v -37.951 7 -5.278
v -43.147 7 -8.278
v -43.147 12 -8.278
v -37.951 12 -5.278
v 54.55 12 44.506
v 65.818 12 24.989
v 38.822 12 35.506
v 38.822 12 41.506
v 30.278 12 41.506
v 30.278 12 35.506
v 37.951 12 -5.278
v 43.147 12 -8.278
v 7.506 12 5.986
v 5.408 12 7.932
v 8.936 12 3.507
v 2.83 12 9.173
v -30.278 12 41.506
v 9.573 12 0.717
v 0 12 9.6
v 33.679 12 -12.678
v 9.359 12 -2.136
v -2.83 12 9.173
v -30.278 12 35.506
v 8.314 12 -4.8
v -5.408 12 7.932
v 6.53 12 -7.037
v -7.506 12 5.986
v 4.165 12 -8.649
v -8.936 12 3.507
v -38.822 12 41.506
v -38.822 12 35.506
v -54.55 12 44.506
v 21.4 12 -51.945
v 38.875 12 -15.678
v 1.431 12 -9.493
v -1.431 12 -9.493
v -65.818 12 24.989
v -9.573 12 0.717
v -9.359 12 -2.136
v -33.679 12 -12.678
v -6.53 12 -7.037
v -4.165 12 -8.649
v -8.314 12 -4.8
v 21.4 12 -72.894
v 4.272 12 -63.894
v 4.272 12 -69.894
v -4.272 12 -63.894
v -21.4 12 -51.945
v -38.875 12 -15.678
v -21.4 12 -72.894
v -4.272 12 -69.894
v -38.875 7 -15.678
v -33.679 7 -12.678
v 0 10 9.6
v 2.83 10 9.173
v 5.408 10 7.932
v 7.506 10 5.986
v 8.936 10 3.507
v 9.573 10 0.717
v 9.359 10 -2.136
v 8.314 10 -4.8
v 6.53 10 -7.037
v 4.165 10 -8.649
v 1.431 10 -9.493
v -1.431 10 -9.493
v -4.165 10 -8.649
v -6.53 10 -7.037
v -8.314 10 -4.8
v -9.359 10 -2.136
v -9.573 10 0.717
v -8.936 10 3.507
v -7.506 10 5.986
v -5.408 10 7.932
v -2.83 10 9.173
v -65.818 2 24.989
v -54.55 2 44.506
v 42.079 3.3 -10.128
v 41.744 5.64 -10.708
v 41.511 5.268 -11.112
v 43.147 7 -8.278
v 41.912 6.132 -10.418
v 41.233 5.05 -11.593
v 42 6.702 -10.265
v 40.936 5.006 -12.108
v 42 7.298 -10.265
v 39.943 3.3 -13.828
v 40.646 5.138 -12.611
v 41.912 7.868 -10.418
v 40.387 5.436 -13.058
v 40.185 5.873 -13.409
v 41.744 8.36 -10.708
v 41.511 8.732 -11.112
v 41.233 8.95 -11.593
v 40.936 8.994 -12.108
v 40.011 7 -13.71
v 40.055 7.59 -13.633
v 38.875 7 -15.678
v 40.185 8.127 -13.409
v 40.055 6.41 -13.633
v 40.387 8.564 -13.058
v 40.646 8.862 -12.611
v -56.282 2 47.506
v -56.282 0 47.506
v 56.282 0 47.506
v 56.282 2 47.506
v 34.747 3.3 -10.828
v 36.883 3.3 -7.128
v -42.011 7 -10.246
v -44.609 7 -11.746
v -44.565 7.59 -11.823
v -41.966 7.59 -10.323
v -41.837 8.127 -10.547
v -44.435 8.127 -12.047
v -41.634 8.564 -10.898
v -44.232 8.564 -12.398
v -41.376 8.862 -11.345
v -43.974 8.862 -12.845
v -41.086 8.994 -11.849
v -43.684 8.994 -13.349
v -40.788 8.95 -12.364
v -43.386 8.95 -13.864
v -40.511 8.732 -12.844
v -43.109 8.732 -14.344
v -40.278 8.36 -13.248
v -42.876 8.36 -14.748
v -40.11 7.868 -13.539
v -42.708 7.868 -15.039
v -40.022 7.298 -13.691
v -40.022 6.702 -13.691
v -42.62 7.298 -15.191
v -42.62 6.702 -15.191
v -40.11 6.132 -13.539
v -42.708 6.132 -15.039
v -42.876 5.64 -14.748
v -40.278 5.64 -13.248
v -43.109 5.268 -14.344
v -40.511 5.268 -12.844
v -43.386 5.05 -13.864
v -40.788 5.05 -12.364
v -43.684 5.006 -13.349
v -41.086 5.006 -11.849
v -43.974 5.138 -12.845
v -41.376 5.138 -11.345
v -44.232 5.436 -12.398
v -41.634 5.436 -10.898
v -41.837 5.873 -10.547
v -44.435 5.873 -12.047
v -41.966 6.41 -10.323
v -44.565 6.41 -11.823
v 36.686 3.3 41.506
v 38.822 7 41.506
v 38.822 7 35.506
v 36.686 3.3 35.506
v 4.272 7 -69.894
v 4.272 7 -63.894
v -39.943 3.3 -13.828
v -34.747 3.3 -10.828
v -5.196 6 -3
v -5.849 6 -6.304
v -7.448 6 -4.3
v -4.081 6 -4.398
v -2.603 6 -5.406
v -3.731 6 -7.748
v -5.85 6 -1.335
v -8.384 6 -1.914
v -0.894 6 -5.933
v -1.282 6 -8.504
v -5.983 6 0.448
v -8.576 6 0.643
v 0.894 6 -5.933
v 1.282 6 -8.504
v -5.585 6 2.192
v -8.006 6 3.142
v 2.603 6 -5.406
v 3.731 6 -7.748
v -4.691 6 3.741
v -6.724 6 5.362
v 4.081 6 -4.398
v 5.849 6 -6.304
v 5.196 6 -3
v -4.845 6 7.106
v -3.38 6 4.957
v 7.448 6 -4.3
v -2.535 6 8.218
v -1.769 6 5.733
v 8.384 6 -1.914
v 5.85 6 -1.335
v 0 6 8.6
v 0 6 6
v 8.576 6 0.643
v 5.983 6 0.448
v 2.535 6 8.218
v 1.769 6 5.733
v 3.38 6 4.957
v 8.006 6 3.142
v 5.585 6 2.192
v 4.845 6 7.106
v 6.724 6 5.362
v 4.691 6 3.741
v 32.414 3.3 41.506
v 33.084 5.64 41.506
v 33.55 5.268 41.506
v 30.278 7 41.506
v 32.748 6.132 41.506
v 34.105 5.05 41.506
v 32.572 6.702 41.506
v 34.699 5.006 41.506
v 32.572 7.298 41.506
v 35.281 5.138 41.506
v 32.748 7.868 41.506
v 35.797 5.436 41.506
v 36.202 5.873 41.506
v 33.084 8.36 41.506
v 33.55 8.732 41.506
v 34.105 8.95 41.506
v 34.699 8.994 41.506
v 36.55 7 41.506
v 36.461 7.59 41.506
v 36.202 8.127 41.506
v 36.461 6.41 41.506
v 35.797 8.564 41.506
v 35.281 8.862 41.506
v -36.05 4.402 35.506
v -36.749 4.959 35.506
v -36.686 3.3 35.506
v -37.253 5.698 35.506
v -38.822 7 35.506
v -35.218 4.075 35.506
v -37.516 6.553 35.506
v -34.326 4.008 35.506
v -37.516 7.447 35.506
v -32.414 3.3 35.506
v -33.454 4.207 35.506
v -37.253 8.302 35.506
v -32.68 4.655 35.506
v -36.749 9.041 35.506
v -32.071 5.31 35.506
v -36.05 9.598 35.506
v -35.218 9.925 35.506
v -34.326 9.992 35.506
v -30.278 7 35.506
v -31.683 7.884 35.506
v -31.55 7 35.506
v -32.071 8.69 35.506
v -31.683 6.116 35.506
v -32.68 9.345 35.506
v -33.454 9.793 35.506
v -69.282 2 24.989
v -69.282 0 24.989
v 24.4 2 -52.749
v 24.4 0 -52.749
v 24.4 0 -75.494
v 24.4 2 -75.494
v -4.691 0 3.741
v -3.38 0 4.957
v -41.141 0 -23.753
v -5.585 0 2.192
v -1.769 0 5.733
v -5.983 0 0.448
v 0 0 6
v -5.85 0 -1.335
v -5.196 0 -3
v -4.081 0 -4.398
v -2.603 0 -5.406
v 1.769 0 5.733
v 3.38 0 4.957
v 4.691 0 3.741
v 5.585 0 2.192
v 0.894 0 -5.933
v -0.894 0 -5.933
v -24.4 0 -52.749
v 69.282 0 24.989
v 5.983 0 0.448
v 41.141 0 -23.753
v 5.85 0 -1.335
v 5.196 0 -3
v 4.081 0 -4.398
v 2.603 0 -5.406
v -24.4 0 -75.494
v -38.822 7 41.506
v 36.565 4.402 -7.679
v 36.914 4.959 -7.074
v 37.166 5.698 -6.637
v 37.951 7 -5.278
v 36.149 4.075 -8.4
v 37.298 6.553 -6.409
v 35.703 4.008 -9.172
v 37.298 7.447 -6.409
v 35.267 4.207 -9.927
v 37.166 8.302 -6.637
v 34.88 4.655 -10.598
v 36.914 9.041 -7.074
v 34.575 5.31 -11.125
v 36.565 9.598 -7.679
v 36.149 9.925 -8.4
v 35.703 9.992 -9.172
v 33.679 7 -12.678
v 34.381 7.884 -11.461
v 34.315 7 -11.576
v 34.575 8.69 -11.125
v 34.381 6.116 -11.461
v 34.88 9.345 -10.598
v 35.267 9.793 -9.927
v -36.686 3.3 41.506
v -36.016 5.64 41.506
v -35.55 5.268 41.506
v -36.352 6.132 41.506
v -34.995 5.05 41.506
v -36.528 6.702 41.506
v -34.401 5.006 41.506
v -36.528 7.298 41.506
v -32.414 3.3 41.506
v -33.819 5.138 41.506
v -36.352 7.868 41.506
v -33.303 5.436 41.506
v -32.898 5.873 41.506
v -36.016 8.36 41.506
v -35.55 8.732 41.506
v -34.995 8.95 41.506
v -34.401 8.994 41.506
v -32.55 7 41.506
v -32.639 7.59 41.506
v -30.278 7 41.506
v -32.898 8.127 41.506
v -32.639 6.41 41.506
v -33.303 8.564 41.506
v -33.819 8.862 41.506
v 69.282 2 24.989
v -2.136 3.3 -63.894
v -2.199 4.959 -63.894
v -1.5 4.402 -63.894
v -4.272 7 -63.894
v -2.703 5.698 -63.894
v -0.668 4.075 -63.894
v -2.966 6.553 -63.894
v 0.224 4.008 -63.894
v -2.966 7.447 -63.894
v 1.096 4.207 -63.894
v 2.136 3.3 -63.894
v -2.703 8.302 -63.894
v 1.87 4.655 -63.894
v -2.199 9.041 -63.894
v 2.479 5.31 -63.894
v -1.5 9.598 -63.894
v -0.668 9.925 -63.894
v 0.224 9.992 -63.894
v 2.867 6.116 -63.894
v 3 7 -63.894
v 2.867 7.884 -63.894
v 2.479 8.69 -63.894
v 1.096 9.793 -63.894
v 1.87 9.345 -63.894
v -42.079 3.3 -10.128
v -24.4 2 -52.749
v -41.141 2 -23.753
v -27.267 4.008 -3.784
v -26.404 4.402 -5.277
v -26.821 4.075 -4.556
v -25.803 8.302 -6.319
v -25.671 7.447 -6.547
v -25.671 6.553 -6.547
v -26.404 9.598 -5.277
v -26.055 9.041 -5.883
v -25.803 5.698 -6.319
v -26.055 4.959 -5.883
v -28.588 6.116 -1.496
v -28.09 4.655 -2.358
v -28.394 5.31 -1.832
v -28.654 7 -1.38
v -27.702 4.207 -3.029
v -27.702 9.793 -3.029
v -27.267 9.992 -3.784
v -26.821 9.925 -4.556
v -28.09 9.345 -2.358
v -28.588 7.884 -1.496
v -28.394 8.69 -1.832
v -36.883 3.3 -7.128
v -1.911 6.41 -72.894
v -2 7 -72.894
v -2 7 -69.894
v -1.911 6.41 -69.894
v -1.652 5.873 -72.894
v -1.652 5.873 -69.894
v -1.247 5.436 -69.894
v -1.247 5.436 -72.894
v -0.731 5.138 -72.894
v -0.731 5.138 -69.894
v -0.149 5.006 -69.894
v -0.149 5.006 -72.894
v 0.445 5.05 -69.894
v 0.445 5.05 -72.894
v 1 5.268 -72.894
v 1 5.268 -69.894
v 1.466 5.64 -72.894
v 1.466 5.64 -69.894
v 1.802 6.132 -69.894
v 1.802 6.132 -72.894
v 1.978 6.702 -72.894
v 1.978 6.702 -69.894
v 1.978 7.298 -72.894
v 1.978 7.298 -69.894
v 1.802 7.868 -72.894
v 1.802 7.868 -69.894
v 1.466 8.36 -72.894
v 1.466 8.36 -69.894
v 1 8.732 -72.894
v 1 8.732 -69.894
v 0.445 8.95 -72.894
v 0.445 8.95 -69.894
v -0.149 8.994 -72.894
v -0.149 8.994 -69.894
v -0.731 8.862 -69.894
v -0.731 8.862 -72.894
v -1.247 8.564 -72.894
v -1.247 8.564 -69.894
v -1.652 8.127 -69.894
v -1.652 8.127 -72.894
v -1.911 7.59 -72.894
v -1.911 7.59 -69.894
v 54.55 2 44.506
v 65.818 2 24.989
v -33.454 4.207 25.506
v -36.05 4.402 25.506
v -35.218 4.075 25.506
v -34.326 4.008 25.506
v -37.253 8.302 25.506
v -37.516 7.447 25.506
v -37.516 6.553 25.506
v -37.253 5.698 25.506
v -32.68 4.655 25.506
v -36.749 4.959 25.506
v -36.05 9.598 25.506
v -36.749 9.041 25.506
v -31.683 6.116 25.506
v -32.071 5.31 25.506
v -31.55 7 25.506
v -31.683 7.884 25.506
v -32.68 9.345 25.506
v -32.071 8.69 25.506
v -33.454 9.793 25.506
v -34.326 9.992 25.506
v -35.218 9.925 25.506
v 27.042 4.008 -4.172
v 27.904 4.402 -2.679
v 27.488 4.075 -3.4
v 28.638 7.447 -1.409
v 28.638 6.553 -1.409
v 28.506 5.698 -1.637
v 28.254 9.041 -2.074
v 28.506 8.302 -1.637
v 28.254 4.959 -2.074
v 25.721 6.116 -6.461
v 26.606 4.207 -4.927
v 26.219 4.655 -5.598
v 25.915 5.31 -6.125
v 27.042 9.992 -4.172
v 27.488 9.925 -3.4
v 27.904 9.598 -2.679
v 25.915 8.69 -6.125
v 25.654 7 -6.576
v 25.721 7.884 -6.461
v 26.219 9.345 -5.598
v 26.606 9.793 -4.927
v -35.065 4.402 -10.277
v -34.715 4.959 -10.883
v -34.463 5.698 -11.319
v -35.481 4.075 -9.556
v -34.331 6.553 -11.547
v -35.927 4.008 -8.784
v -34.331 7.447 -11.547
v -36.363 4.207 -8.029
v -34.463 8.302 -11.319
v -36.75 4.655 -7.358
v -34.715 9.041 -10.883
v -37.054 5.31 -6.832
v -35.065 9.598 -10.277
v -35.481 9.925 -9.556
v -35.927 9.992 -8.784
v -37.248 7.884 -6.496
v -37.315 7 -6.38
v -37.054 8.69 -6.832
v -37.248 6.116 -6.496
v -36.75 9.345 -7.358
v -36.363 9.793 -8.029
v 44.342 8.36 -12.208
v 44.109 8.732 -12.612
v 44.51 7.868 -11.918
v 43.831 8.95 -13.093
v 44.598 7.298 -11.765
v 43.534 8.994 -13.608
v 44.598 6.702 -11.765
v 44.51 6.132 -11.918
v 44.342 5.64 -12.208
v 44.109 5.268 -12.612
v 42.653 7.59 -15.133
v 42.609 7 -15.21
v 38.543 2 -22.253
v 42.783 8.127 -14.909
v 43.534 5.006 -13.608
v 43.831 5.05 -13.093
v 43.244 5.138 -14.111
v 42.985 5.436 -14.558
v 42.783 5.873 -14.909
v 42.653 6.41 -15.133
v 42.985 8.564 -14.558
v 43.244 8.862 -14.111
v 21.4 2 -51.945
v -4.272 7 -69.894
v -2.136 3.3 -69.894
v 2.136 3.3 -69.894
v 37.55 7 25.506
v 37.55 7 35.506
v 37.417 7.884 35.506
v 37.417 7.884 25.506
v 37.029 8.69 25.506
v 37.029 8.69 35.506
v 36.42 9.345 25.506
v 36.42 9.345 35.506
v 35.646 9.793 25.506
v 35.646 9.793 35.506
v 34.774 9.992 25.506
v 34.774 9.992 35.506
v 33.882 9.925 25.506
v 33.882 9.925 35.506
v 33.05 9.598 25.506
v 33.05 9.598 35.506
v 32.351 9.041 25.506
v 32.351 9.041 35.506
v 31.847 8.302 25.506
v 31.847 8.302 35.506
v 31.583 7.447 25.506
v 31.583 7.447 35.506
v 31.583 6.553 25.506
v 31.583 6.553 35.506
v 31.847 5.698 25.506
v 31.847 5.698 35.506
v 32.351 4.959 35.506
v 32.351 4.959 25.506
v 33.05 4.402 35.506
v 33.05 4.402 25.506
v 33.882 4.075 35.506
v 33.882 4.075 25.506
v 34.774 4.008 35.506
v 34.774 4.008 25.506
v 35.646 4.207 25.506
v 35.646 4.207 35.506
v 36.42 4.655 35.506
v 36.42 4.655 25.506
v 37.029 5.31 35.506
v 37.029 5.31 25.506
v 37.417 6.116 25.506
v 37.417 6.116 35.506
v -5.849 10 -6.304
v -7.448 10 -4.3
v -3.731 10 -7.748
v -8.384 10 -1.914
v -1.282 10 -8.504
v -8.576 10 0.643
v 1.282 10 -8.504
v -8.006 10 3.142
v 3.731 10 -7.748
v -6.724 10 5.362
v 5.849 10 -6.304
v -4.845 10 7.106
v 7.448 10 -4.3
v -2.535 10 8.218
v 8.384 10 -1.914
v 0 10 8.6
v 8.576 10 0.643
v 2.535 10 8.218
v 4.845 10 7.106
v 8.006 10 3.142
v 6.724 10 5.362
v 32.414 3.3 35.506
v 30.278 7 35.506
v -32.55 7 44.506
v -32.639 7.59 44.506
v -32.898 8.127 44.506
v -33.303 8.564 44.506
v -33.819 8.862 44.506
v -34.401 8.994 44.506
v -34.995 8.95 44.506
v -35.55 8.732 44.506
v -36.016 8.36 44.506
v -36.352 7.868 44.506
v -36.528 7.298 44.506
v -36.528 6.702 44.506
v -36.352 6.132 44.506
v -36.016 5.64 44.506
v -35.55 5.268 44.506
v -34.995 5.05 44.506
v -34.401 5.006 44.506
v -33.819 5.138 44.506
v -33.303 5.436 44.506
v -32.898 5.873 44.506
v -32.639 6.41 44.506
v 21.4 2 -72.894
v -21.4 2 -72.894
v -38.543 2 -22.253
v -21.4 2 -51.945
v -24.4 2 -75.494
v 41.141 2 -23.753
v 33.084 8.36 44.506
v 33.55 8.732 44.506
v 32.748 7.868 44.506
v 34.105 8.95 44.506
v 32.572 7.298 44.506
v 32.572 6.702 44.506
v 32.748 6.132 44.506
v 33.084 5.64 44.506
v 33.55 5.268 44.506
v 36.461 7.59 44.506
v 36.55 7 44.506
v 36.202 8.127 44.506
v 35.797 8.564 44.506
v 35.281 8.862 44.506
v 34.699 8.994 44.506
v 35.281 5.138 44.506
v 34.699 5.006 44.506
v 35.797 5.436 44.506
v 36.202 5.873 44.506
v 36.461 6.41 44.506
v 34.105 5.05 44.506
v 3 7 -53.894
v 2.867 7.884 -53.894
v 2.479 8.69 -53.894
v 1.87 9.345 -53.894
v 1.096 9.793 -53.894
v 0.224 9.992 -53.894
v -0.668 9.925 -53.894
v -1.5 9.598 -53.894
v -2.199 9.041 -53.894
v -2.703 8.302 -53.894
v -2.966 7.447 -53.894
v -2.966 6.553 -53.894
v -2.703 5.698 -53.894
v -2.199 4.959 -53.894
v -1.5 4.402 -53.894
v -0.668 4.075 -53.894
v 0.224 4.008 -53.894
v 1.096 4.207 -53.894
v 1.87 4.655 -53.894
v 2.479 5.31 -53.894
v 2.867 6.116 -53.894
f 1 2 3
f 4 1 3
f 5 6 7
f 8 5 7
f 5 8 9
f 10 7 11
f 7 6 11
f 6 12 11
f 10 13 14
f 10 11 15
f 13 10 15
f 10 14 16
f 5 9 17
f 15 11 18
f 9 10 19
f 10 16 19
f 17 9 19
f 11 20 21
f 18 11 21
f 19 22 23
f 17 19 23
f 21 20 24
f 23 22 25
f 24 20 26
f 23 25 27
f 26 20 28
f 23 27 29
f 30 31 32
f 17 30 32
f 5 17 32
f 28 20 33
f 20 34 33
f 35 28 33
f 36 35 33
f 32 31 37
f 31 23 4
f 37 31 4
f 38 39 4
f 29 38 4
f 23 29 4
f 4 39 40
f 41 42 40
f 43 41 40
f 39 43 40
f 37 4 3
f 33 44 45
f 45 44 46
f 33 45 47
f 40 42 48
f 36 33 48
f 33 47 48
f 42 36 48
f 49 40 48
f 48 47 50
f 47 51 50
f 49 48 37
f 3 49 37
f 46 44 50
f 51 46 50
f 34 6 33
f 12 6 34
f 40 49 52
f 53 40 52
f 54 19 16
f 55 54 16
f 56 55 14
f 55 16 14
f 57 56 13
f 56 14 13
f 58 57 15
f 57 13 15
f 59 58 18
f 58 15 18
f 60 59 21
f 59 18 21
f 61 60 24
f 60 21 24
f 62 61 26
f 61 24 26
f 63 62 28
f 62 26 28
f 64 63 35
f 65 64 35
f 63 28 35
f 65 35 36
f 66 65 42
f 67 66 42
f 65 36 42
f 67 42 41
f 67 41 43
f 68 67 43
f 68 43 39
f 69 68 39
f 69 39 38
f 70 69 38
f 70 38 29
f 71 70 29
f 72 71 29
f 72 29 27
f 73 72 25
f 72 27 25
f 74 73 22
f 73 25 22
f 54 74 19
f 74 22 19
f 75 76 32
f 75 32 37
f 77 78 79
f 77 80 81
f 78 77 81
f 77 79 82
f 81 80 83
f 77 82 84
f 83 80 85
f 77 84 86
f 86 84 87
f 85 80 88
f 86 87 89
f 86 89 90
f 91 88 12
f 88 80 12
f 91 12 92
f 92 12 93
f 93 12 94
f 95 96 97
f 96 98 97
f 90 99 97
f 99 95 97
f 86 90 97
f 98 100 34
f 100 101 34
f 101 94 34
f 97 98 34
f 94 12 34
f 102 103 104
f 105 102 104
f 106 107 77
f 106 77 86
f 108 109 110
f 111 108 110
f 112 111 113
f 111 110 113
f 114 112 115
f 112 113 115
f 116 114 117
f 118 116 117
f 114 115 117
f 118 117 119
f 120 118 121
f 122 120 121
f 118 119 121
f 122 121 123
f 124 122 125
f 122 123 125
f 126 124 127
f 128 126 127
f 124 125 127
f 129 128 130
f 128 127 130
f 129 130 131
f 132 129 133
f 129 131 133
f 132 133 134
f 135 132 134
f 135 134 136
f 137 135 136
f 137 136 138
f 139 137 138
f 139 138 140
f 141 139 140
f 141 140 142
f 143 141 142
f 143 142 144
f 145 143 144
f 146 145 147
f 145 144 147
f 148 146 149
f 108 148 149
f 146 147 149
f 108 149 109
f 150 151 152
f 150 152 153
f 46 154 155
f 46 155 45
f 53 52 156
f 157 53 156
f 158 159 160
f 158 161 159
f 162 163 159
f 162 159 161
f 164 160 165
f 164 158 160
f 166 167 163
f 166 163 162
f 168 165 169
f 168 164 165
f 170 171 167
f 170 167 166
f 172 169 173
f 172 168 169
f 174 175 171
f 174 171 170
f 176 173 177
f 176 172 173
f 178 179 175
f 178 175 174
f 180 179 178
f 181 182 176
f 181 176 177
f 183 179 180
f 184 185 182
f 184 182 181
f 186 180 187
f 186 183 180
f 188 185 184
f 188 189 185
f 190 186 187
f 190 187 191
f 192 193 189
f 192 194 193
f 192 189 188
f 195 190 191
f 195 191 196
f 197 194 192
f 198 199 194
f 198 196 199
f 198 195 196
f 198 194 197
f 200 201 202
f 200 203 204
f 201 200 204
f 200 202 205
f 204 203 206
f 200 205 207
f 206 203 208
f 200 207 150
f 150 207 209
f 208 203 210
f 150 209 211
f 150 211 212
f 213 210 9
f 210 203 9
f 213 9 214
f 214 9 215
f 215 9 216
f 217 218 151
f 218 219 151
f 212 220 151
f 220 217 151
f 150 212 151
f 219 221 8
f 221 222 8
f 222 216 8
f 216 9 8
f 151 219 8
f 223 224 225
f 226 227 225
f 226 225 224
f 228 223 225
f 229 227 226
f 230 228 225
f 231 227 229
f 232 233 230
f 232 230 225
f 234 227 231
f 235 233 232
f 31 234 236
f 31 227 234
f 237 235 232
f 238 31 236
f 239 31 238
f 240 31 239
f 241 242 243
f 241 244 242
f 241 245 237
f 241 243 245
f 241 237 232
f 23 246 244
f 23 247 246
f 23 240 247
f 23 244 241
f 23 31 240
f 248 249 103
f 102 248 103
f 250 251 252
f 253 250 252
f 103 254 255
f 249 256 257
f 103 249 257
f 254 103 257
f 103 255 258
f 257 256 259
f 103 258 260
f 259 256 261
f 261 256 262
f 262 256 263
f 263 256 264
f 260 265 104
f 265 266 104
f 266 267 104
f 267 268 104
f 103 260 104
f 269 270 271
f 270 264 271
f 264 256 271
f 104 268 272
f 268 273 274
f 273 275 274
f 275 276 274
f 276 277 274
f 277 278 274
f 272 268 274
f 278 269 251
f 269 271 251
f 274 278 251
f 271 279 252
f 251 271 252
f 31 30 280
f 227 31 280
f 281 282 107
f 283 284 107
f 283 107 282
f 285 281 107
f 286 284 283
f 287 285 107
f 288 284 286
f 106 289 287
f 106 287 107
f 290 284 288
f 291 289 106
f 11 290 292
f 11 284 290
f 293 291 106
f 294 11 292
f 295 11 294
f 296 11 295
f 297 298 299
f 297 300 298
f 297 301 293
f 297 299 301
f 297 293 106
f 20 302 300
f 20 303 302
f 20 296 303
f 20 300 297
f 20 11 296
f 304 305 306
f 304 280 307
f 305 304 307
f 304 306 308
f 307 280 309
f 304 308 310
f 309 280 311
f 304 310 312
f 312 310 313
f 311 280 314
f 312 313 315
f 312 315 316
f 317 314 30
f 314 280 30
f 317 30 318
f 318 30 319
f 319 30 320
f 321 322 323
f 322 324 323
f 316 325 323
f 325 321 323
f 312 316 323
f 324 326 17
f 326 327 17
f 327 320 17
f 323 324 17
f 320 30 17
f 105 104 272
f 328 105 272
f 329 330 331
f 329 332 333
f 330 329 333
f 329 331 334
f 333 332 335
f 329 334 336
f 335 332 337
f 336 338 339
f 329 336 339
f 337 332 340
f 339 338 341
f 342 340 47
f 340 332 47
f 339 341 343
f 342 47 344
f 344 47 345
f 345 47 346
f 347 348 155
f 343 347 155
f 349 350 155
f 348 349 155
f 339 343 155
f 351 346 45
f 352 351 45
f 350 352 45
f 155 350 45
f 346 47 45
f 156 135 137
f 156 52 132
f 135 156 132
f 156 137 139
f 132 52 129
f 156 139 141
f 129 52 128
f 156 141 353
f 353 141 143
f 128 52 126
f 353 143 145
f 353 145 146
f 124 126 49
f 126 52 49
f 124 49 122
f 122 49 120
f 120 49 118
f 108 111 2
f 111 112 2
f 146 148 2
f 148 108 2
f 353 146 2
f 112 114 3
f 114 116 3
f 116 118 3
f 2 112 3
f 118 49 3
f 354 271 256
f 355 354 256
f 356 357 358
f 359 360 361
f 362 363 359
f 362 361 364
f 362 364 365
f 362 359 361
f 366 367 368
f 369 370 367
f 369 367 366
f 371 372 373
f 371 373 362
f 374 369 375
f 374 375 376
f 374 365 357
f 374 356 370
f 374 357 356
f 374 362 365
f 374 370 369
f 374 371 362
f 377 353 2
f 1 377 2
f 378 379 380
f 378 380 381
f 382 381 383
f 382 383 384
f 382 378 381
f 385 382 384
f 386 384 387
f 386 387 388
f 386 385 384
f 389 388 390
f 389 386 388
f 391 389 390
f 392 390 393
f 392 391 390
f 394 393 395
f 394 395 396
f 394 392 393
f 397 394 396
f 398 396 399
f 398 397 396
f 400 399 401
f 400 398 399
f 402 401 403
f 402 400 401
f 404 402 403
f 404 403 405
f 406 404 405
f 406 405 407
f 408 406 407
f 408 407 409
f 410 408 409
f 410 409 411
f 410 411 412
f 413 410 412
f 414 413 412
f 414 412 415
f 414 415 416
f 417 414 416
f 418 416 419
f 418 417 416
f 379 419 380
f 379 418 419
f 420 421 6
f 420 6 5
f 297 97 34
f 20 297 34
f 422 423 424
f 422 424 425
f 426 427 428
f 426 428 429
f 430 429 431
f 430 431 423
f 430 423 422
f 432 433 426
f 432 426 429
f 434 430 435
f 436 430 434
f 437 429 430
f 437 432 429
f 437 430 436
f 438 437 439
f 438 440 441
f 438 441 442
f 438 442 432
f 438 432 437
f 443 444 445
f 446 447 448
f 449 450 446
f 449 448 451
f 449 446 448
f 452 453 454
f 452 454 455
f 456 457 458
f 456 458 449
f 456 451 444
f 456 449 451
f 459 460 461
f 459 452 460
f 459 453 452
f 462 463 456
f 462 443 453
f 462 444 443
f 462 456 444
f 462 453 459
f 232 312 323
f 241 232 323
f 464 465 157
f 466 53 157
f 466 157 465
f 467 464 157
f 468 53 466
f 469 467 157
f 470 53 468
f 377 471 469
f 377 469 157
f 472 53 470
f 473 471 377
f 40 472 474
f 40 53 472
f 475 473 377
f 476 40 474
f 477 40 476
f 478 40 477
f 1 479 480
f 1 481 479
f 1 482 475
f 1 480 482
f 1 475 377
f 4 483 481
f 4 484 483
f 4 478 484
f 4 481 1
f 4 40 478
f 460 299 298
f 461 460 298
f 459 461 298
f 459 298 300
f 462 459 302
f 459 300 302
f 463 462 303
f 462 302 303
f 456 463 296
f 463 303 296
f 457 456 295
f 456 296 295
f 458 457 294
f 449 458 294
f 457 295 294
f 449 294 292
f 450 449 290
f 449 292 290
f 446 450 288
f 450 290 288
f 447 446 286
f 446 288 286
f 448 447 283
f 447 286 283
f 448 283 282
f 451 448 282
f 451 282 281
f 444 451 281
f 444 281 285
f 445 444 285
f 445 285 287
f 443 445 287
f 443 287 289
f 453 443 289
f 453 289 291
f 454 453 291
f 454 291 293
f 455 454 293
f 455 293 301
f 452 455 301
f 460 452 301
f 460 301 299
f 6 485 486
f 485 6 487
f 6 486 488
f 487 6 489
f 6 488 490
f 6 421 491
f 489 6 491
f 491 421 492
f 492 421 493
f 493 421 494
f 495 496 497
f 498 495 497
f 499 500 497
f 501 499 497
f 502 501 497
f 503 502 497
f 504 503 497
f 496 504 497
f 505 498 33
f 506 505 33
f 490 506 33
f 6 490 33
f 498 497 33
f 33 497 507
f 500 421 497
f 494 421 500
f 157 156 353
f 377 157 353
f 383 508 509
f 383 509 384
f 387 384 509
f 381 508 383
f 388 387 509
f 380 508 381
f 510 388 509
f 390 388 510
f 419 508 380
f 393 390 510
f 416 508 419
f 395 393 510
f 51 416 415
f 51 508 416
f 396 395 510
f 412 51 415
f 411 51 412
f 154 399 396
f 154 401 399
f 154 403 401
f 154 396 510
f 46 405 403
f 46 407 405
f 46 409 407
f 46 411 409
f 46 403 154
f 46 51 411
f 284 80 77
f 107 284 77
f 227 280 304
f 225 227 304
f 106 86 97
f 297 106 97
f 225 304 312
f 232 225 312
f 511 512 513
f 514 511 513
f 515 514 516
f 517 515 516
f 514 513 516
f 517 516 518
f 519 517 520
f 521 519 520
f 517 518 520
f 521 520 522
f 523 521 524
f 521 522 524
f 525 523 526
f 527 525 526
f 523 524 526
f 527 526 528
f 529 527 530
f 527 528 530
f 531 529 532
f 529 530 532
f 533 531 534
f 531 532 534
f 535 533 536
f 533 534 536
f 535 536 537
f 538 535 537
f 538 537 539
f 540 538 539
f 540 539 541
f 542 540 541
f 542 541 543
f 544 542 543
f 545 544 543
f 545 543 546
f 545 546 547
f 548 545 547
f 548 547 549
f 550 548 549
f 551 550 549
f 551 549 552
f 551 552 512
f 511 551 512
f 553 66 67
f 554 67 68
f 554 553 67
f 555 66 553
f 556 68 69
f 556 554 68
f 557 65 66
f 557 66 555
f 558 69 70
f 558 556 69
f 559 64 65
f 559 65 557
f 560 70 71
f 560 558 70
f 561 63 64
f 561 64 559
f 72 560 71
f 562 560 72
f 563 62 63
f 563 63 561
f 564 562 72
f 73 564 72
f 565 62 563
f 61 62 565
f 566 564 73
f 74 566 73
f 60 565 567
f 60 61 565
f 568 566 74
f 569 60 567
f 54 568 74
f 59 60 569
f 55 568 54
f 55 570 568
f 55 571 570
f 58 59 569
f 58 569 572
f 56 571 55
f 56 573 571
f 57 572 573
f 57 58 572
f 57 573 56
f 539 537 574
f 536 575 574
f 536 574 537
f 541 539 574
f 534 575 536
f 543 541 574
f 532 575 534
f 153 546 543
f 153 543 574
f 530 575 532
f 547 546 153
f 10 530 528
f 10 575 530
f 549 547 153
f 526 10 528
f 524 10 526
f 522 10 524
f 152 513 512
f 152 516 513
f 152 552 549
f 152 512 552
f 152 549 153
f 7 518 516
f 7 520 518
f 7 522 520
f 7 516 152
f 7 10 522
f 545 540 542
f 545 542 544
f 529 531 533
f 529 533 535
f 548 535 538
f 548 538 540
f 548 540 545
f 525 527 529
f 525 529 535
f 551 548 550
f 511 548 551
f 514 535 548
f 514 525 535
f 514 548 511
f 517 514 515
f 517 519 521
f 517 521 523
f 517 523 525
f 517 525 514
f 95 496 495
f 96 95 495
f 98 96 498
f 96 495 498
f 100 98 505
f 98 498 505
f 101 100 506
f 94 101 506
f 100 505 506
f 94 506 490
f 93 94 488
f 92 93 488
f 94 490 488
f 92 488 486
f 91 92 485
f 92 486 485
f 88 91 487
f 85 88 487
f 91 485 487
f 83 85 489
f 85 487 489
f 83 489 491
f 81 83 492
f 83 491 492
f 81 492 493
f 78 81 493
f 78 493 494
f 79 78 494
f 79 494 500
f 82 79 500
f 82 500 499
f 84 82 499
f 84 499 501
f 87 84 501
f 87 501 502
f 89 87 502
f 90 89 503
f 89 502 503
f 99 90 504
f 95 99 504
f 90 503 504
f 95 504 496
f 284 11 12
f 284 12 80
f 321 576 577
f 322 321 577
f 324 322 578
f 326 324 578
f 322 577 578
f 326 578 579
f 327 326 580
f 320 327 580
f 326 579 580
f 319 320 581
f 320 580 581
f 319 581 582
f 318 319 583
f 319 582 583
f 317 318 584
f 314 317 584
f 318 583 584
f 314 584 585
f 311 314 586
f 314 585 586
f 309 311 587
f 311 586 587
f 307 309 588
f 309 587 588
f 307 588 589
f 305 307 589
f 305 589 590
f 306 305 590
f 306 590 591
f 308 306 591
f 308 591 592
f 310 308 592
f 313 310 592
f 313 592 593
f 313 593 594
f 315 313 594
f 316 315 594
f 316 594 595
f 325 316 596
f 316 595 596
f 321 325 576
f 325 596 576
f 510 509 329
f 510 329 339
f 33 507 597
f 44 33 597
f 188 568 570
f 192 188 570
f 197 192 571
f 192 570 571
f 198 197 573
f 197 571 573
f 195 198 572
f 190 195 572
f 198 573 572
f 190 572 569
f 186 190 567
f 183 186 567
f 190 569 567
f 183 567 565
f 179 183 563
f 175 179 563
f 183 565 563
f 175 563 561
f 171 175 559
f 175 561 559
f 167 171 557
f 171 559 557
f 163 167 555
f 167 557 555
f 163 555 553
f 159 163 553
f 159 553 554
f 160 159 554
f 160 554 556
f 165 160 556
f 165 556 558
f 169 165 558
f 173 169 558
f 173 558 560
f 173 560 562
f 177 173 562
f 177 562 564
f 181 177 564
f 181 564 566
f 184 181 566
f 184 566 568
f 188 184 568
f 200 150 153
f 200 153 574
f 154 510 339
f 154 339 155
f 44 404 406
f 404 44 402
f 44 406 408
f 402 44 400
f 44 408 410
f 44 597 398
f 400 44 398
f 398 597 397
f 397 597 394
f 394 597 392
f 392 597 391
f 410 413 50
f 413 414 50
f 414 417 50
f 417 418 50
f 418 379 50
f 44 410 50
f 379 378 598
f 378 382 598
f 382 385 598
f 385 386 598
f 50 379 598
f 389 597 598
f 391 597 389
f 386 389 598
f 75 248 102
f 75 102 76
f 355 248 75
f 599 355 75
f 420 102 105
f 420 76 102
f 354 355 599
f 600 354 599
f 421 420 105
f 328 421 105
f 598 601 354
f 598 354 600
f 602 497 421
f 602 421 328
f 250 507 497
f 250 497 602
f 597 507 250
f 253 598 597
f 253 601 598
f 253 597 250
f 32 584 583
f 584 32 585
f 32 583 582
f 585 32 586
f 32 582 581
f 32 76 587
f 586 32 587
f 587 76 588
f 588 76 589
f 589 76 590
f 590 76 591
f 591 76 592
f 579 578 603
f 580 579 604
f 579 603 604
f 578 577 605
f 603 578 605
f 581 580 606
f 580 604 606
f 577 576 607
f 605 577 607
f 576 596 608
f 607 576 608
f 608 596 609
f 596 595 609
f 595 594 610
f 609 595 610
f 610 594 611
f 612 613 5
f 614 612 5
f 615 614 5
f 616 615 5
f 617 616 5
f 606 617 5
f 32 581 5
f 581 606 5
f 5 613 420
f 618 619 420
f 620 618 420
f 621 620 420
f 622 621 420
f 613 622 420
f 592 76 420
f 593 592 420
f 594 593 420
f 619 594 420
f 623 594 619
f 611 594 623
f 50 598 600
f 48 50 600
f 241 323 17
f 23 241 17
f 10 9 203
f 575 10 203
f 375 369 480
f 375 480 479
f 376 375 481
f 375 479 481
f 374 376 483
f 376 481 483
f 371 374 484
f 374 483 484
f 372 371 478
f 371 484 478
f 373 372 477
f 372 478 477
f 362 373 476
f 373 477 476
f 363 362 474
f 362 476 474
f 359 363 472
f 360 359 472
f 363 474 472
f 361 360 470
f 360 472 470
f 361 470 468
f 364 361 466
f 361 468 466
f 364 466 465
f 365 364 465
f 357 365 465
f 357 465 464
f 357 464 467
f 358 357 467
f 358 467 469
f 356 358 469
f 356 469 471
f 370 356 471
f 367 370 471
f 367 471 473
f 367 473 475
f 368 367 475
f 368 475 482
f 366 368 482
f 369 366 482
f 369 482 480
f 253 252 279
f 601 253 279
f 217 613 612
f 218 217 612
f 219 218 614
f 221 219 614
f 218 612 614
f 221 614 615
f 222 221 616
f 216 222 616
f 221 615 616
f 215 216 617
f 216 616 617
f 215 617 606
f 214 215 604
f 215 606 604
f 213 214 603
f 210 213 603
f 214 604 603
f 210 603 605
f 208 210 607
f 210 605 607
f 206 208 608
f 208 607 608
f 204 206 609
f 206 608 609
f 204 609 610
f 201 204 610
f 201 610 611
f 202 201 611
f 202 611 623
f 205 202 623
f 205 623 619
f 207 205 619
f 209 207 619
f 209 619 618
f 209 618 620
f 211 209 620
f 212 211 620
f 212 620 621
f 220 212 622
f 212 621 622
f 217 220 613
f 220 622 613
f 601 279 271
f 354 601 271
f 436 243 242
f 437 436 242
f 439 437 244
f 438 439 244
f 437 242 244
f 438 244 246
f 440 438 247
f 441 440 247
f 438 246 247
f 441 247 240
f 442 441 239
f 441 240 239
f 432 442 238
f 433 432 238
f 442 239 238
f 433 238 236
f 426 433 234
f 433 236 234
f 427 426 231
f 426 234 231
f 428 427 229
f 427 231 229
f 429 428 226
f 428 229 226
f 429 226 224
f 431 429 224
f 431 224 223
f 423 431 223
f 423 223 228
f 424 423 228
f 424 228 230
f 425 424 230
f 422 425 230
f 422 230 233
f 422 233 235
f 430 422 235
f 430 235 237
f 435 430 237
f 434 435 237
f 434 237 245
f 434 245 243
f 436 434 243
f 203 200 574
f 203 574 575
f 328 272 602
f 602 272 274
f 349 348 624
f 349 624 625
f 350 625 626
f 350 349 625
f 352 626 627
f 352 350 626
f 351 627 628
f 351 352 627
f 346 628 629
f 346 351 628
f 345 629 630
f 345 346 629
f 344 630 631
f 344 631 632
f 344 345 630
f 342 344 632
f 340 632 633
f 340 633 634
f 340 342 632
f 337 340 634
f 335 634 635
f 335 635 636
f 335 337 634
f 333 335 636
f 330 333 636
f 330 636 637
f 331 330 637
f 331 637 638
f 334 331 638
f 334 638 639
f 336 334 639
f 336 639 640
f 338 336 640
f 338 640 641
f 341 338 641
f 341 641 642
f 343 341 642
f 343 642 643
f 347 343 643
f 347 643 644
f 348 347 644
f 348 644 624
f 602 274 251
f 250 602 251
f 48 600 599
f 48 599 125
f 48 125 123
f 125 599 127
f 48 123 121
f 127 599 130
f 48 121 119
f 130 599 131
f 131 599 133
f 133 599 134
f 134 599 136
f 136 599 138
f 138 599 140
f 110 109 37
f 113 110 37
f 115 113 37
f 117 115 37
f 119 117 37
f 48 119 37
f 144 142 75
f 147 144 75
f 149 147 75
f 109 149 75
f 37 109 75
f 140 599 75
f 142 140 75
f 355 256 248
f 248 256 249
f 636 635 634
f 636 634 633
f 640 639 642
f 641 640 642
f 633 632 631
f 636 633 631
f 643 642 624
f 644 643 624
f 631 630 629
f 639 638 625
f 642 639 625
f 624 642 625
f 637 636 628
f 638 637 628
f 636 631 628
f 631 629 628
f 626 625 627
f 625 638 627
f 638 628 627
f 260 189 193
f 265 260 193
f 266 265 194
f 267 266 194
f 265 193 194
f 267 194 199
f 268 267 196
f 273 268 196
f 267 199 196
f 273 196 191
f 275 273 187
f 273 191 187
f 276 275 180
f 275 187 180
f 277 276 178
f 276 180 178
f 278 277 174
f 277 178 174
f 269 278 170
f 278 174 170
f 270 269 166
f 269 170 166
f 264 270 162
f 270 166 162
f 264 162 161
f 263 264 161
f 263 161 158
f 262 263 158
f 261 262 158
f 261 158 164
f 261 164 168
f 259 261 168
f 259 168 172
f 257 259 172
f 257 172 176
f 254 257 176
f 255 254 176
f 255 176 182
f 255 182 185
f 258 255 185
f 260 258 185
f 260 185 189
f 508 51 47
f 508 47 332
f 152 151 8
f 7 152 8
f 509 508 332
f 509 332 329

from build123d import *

# Parameters (mm, degrees)
SKETCH1_R           = 9.6
SKETCH1_R_2         = 8.6
SKETCH1_R_3         = 6
BOSS_EXTRUDE1_DEPTH = 12
BOSS_EXTRUDE2_DEPTH = 2
CUT_EXTRUDE1_START  = 12
SKETCH1_4_R         = 9.6
SKETCH1_4_R_2       = 8.6
CUT_EXTRUDE1_DEPTH  = 2
CUT_EXTRUDE2_START  = 12
SKETCH1_5_R         = 8.6
SKETCH1_5_R_2       = 6
CUT_EXTRUDE2_DEPTH  = 6
CUT_EXTRUDE3_START  = 12
SKETCH1_6_R         = 6
CUT_EXTRUDE3_DEPTH  = 116.166910647
SKETCH2_R           = 2
CUT_EXTRUDE4_DEPTH  = 3
CUT_EXTRUDE5_START  = -3
SKETCH2_4_R         = 3
SKETCH2_4_R_2       = 2
CUT_EXTRUDE5_DEPTH  = 6
CUT_EXTRUDE6_START  = -3
SKETCH2_5_R         = 3
SKETCH2_5_R_2       = 2
CUT_EXTRUDE6_DEPTH  = 16
SKETCH3_R           = 2
CUT_EXTRUDE7_DEPTH  = 3
CUT_EXTRUDE8_START  = 3
SKETCH3_7_R         = 3
SKETCH3_7_R_2       = 2
CUT_EXTRUDE8_DEPTH  = 6
CUT_EXTRUDE9_START  = 3
SKETCH3_8_R         = 3
SKETCH3_8_R_2       = 2
CUT_EXTRUDE9_DEPTH  = 16
SKETCH4_R           = 2
CUT_EXTRUDE10_DEPTH = 3
CUT_EXTRUDE11_START = -3
SKETCH4_3_R         = 3
SKETCH4_3_R_2       = 2
CUT_EXTRUDE11_DEPTH = 6
CUT_EXTRUDE12_START = -3
SKETCH4_4_R         = 3
SKETCH4_4_R_2       = 2
CUT_EXTRUDE12_DEPTH = 16
SKETCH5_R           = 2
CUT_EXTRUDE13_DEPTH = 3
CUT_EXTRUDE14_START = -3
SKETCH5_3_R         = 3
SKETCH5_3_R_2       = 2
CUT_EXTRUDE14_DEPTH = 6
CUT_EXTRUDE15_START = -3
SKETCH5_4_R         = 3
SKETCH5_4_R_2       = 2
CUT_EXTRUDE15_DEPTH = 16


with BuildPart() as part:
    # Sketch1 → Boss-Extrude1 (new body)
    # profile 1 of 7: a face of its own
    with BuildSketch(Plane(origin=(0, 0, 0), x_dir=(1, 0, 0), z_dir=(0, 1, 0))):
        Polygon((-65.817930688, -24.988893001), (-38.54293994, 22.25277675), (-11.267949192, 69.494446501), (11.267949192, 69.494446501), (38.54293994, 22.25277675), (65.817930688, -24.988893001), (54.549981495, -44.505553499), (0, -44.505553499), (-54.549981495, -44.505553499), align=None)
        Polygon((-52.817930688, -41.505553499), (-62.353829072, -24.988893001), (-35.944863729, 20.75277675), (-9.535898385, 66.494446501), (9.535898385, 66.494446501), (35.944863729, 20.75277675), (62.353829072, -24.988893001), (52.817930688, -41.505553499), (0, -41.505553499), align=None, mode=Mode.SUBTRACT)
    # profile 2 of 7: a face of its own
    with BuildSketch(Plane(origin=(0, 0, 0), x_dir=(1, 0, 0), z_dir=(0, 1, 0))):
        Polygon((-62.353829072, -24.988893001), (-35.944863729, 20.75277675), (-9.535898385, 66.494446501), (9.535898385, 66.494446501), (35.944863729, 20.75277675), (62.353829072, -24.988893001), (52.817930688, -41.505553499), (0, -41.505553499), (-52.817930688, -41.505553499), align=None)
        Circle(SKETCH1_R, mode=Mode.SUBTRACT)
    # profile 3 of 7: a face of its own
    with BuildSketch(Plane(origin=(0, 0, 0), x_dir=(1, 0, 0), z_dir=(0, 1, 0))):
        Polygon((13, 72.494446501), (-13, 72.494446501), (-21.4, 57.945219717), (-21.4, 51.945219717), (-11.267949192, 69.494446501), (11.267949192, 69.494446501), (21.4, 51.945219717), (21.4, 57.945219717), align=None)
    # profile 4 of 7: a face of its own
    with BuildSketch(Plane(origin=(0, 0, 0), x_dir=(1, 0, 0), z_dir=(0, 1, 0))):
        Polygon((-21.4, 57.945219717), (-13, 72.494446501), (13, 72.494446501), (21.4, 57.945219717), (21.4, 72.894446501), (-21.4, 72.894446501), align=None)
    # profile 5 of 7: a face of its own
    with BuildSketch(Plane(origin=(0, 0, 0), x_dir=(1, 0, 0), z_dir=(0, 1, 0))):
        Circle(SKETCH1_R)
        Circle(SKETCH1_R_2, mode=Mode.SUBTRACT)
    # profile 6 of 7: a face of its own
    with BuildSketch(Plane(origin=(0, 0, 0), x_dir=(1, 0, 0), z_dir=(0, 1, 0))):
        Circle(SKETCH1_R_2)
        Circle(SKETCH1_R_3, mode=Mode.SUBTRACT)
    # profile 7 of 7: a face of its own
    with BuildSketch(Plane(origin=(0, 0, 0), x_dir=(1, 0, 0), z_dir=(0, 1, 0))):
        Circle(SKETCH1_R_3)
    extrude(amount=BOSS_EXTRUDE1_DEPTH)

    # Sketch1<3> → Boss-Extrude2 (add)
    with BuildSketch(Plane(origin=(0, 0, 0), x_dir=(1, 0, 0), z_dir=(0, 1, 0))):
        Polygon((56.282032303, -47.505553499), (69.282032303, -24.988893001), (41.141016151, 23.75277675), (24.4, 52.749067294), (24.4, 75.494446501), (-24.4, 75.494446501), (-24.4, 52.749067294), (-41.141016151, 23.75277675), (-69.282032303, -24.988893001), (-56.282032303, -47.505553499), (0, -47.505553499), align=None)
        Polygon((-21.4, 51.945219717), (-21.4, 57.945219717), (-21.4, 72.894446501), (21.4, 72.894446501), (21.4, 57.945219717), (21.4, 51.945219717), (38.54293994, 22.25277675), (65.817930688, -24.988893001), (54.549981495, -44.505553499), (0, -44.505553499), (-54.549981495, -44.505553499), (-65.817930688, -24.988893001), (-38.54293994, 22.25277675), align=None, mode=Mode.SUBTRACT)
    extrude(amount=BOSS_EXTRUDE2_DEPTH)

    # Sketch1<4> → Cut-Extrude1 (cut)
    with BuildSketch(Plane(origin=(0, 0, 0), x_dir=(1, 0, 0), z_dir=(0, 1, 0)).offset(CUT_EXTRUDE1_START)):
        with Locations(Location((0, 0, 0), (0, 0, 270))):
            Circle(SKETCH1_4_R)
        with Locations(Location((0, 0, 0), (0, 0, 270))):
            Circle(SKETCH1_4_R_2, mode=Mode.SUBTRACT)
    extrude(amount=-CUT_EXTRUDE1_DEPTH, mode=Mode.SUBTRACT)

    # Sketch1<5> → Cut-Extrude2 (cut)
    with BuildSketch(Plane(origin=(0, 0, 0), x_dir=(1, 0, 0), z_dir=(0, 1, 0)).offset(CUT_EXTRUDE2_START)):
        with Locations(Location((0, 0, 0), (0, 0, 270))):
            Circle(SKETCH1_5_R)
        with Locations(Location((0, 0, 0), (0, 0, 270))):
            Circle(SKETCH1_5_R_2, mode=Mode.SUBTRACT)
    extrude(amount=-CUT_EXTRUDE2_DEPTH, mode=Mode.SUBTRACT)

    # Sketch1<6> → Cut-Extrude3 (cut, through all)
    with BuildSketch(Plane(origin=(0, 0, 0), x_dir=(1, 0, 0), z_dir=(0, 1, 0)).offset(CUT_EXTRUDE3_START)):
        with Locations(Location((0, 0, 0), (0, 0, 270))):
            Circle(SKETCH1_6_R)
    extrude(amount=-CUT_EXTRUDE3_DEPTH, mode=Mode.SUBTRACT)

    # Sketch2 → Cut-Extrude4 (cut)
    with BuildSketch(Plane.XY.offset(44.505553499)):
        with Locations((-34.549981495, 7)):
            Circle(SKETCH2_R)
        with Locations((34.549981495, 7)):
            Circle(SKETCH2_R)
    extrude(amount=-CUT_EXTRUDE4_DEPTH, mode=Mode.SUBTRACT)

    # Sketch2<4> → Cut-Extrude5 (cut)
    # profile 1 of 8: a face of its own
    with BuildSketch(Plane.XY.offset(44.505553499).offset(CUT_EXTRUDE5_START)):
        Polygon((-38.822373487, 12), (-38.822373487, 7), (-36.686177491, 10.7), (-32.413785499, 10.7), (-30.277589503, 7), (-30.277589503, 12), align=None)
    # profile 2 of 8: a face of its own
    with BuildSketch(Plane.XY.offset(44.505553499).offset(CUT_EXTRUDE5_START)):
        Polygon((-32.413785499, 10.7), (-36.686177491, 10.7), (-38.822373487, 7), (-36.686177491, 3.3), (-32.413785499, 3.3), (-30.277589503, 7), align=None)
        with Locations((-34.549981495, 7)):
            Circle(SKETCH2_4_R, mode=Mode.SUBTRACT)
    # profile 3 of 8: a face of its own
    with BuildSketch(Plane.XY.offset(44.505553499).offset(CUT_EXTRUDE5_START)):
        with Locations((-34.549981495, 7)):
            Circle(SKETCH2_4_R)
        with Locations((-34.549981495, 7)):
            Circle(SKETCH2_4_R_2, mode=Mode.SUBTRACT)
    # profile 4 of 8: a face of its own
    with BuildSketch(Plane.XY.offset(44.505553499).offset(CUT_EXTRUDE5_START)):
        with Locations((-34.549981495, 7)):
            Circle(SKETCH2_4_R_2)
    # profile 5 of 8: a face of its own
    with BuildSketch(Plane.XY.offset(44.505553499).offset(CUT_EXTRUDE5_START)):
        Polygon((38.822373487, 7), (36.686177491, 3.3), (32.413785499, 3.3), (30.277589503, 7), (32.413785499, 10.7), (36.686177491, 10.7), align=None)
        with Locations((34.549981495, 7)):
            Circle(SKETCH2_4_R, mode=Mode.SUBTRACT)
    # profile 6 of 8: a face of its own
    with BuildSketch(Plane.XY.offset(44.505553499).offset(CUT_EXTRUDE5_START)):
        with Locations((34.549981495, 7)):
            Circle(SKETCH2_4_R)
        with Locations((34.549981495, 7)):
            Circle(SKETCH2_4_R_2, mode=Mode.SUBTRACT)
    # profile 7 of 8: a face of its own
    with BuildSketch(Plane.XY.offset(44.505553499).offset(CUT_EXTRUDE5_START)):
        with Locations((34.549981495, 7)):
            Circle(SKETCH2_4_R_2)
    # profile 8 of 8: a face of its own
    with BuildSketch(Plane.XY.offset(44.505553499).offset(CUT_EXTRUDE5_START)):
        Polygon((38.822373487, 12), (30.277589503, 12), (30.277589503, 7), (32.413785499, 10.7), (36.686177491, 10.7), (38.822373487, 7), align=None)
    extrude(amount=-CUT_EXTRUDE5_DEPTH, mode=Mode.SUBTRACT)

    # Sketch2<5> → Cut-Extrude6 (cut)
    # profile 1 of 4: a face of its own
    with BuildSketch(Plane.XY.offset(44.505553499).offset(CUT_EXTRUDE6_START)):
        with Locations((-34.549981495, 7)):
            Circle(SKETCH2_5_R)
        with Locations((-34.549981495, 7)):
            Circle(SKETCH2_5_R_2, mode=Mode.SUBTRACT)
    # profile 2 of 4: a face of its own
    with BuildSketch(Plane.XY.offset(44.505553499).offset(CUT_EXTRUDE6_START)):
        with Locations((34.549981495, 7)):
            Circle(SKETCH2_5_R)
        with Locations((34.549981495, 7)):
            Circle(SKETCH2_5_R_2, mode=Mode.SUBTRACT)
    # profile 3 of 4: a face of its own
    with BuildSketch(Plane.XY.offset(44.505553499).offset(CUT_EXTRUDE6_START)):
        with Locations((-34.549981495, 7)):
            Circle(SKETCH2_5_R_2)
    # profile 4 of 4: a face of its own
    with BuildSketch(Plane.XY.offset(44.505553499).offset(CUT_EXTRUDE6_START)):
        with Locations((34.549981495, 7)):
            Circle(SKETCH2_5_R_2)
    extrude(amount=-CUT_EXTRUDE6_DEPTH, mode=Mode.SUBTRACT)

    # Sketch3 → Cut-Extrude7 (cut)
    with BuildSketch(Plane.XY.offset(-72.894446501)):
        with Locations(Location((0, 7, 0), (0, 0, 180))):
            Circle(SKETCH3_R)
    extrude(amount=CUT_EXTRUDE7_DEPTH, mode=Mode.SUBTRACT)

    # Sketch3<7> → Cut-Extrude8 (cut)
    # profile 1 of 4: a face of its own
    with BuildSketch(Plane.XY.offset(-72.894446501).offset(CUT_EXTRUDE8_START)):
        Polygon((2.136195996, 10.7), (4.272391992, 7), (4.272391992, 12), (-4.272391992, 12), (-4.272391992, 7), (-2.136195996, 10.7), align=None)
    # profile 2 of 4: a face of its own
    with BuildSketch(Plane.XY.offset(-72.894446501).offset(CUT_EXTRUDE8_START)):
        Polygon((2.136195996, 3.3), (4.272391992, 7), (2.136195996, 10.7), (-2.136195996, 10.7), (-4.272391992, 7), (-2.136195996, 3.3), align=None)
        with Locations((0, 7)):
            Circle(SKETCH3_7_R, mode=Mode.SUBTRACT)
    # profile 3 of 4: a face of its own
    with BuildSketch(Plane.XY.offset(-72.894446501).offset(CUT_EXTRUDE8_START)):
        with Locations((0, 7)):
            Circle(SKETCH3_7_R)
        with Locations(Location((0, 7, 0), (0, 0, 180))):
            Circle(SKETCH3_7_R_2, mode=Mode.SUBTRACT)
    # profile 4 of 4: a face of its own
    with BuildSketch(Plane.XY.offset(-72.894446501).offset(CUT_EXTRUDE8_START)):
        with Locations(Location((0, 7, 0), (0, 0, 180))):
            Circle(SKETCH3_7_R_2)
    extrude(amount=CUT_EXTRUDE8_DEPTH, mode=Mode.SUBTRACT)

    # Sketch3<8> → Cut-Extrude9 (cut)
    # profile 1 of 2: a face of its own
    with BuildSketch(Plane.XY.offset(-72.894446501).offset(CUT_EXTRUDE9_START)):
        with Locations((0, 7)):
            Circle(SKETCH3_8_R)
        with Locations(Location((0, 7, 0), (0, 0, 180))):
            Circle(SKETCH3_8_R_2, mode=Mode.SUBTRACT)
    # profile 2 of 2: a face of its own
    with BuildSketch(Plane.XY.offset(-72.894446501).offset(CUT_EXTRUDE9_START)):
        with Locations(Location((0, 7, 0), (0, 0, 180))):
            Circle(SKETCH3_8_R_2)
    extrude(amount=CUT_EXTRUDE9_DEPTH, mode=Mode.SUBTRACT)

    # Sketch4 → Cut-Extrude10 (cut)
    with BuildSketch(Plane(origin=(38.54293994, 0, -22.25277675), x_dir=(-0.5000000000000003, 0, -0.8660254037844386), z_dir=(0.8660254037844385, 0, -0.5000000000000002))):
        with Locations((-10.132050808, 7)):
            Circle(SKETCH4_R)
    extrude(amount=-CUT_EXTRUDE10_DEPTH, mode=Mode.SUBTRACT)

    # Sketch4<3> → Cut-Extrude11 (cut)
    # profile 1 of 4: a face of its own
    with BuildSketch(Plane(origin=(38.54293994, 0, -22.25277675), x_dir=(-0.5000000000000003, 0, -0.8660254037844386), z_dir=(0.8660254037844385, 0, -0.5000000000000002)).offset(CUT_EXTRUDE11_START)):
        Polygon((-14.4044428, 12), (-14.4044428, 7), (-12.268246804, 10.7), (-7.995854812, 10.7), (-5.859658816, 7), (-5.859658816, 12), align=None)
    # profile 2 of 4: a face of its own
    with BuildSketch(Plane(origin=(38.54293994, 0, -22.25277675), x_dir=(-0.5000000000000003, 0, -0.8660254037844386), z_dir=(0.8660254037844385, 0, -0.5000000000000002)).offset(CUT_EXTRUDE11_START)):
        Polygon((-7.995854812, 10.7), (-12.268246804, 10.7), (-14.4044428, 7), (-12.268246804, 3.3), (-7.995854812, 3.3), (-5.859658816, 7), align=None)
        with Locations((-10.132050808, 7)):
            Circle(SKETCH4_3_R, mode=Mode.SUBTRACT)
    # profile 3 of 4: a face of its own
    with BuildSketch(Plane(origin=(38.54293994, 0, -22.25277675), x_dir=(-0.5000000000000003, 0, -0.8660254037844386), z_dir=(0.8660254037844385, 0, -0.5000000000000002)).offset(CUT_EXTRUDE11_START)):
        with Locations((-10.132050808, 7)):
            Circle(SKETCH4_3_R)
        with Locations((-10.132050808, 7)):
            Circle(SKETCH4_3_R_2, mode=Mode.SUBTRACT)
    # profile 4 of 4: a face of its own
    with BuildSketch(Plane(origin=(38.54293994, 0, -22.25277675), x_dir=(-0.5000000000000003, 0, -0.8660254037844386), z_dir=(0.8660254037844385, 0, -0.5000000000000002)).offset(CUT_EXTRUDE11_START)):
        with Locations((-10.132050808, 7)):
            Circle(SKETCH4_3_R_2)
    extrude(amount=-CUT_EXTRUDE11_DEPTH, mode=Mode.SUBTRACT)

    # Sketch4<4> → Cut-Extrude12 (cut)
    # profile 1 of 2: a face of its own
    with BuildSketch(Plane(origin=(38.54293994, 0, -22.25277675), x_dir=(-0.5000000000000003, 0, -0.8660254037844386), z_dir=(0.8660254037844385, 0, -0.5000000000000002)).offset(CUT_EXTRUDE12_START)):
        with Locations((-10.132050808, 7)):
            Circle(SKETCH4_4_R)
        with Locations((-10.132050808, 7)):
            Circle(SKETCH4_4_R_2, mode=Mode.SUBTRACT)
    # profile 2 of 2: a face of its own
    with BuildSketch(Plane(origin=(38.54293994, 0, -22.25277675), x_dir=(-0.5000000000000003, 0, -0.8660254037844386), z_dir=(0.8660254037844385, 0, -0.5000000000000002)).offset(CUT_EXTRUDE12_START)):
        with Locations((-10.132050808, 7)):
            Circle(SKETCH4_4_R_2)
    extrude(amount=-CUT_EXTRUDE12_DEPTH, mode=Mode.SUBTRACT)

    # Sketch5 → Cut-Extrude13 (cut)
    with BuildSketch(Plane(origin=(-38.54293994, 0, -22.25277675), x_dir=(-0.4999999999999996, 0, 0.8660254037844389), z_dir=(-0.8660254037844389, 0, -0.4999999999999996))):
        with Locations((10.132050808, 7)):
            Circle(SKETCH5_R)
    extrude(amount=-CUT_EXTRUDE13_DEPTH, mode=Mode.SUBTRACT)

    # Sketch5<3> → Cut-Extrude14 (cut)
    # profile 1 of 4: a face of its own
    with BuildSketch(Plane(origin=(-38.54293994, 0, -22.25277675), x_dir=(-0.4999999999999996, 0, 0.8660254037844389), z_dir=(-0.8660254037844389, 0, -0.4999999999999996)).offset(CUT_EXTRUDE14_START)):
        Polygon((5.859658816, 12), (5.859658816, 7), (7.995854812, 10.7), (12.268246804, 10.7), (14.4044428, 7), (14.4044428, 12), align=None)
    # profile 2 of 4: a face of its own
    with BuildSketch(Plane(origin=(-38.54293994, 0, -22.25277675), x_dir=(-0.4999999999999996, 0, 0.8660254037844389), z_dir=(-0.8660254037844389, 0, -0.4999999999999996)).offset(CUT_EXTRUDE14_START)):
        Polygon((12.268246804, 10.7), (7.995854812, 10.7), (5.859658816, 7), (7.995854812, 3.3), (12.268246804, 3.3), (14.4044428, 7), align=None)
        with Locations((10.132050808, 7)):
            Circle(SKETCH5_3_R, mode=Mode.SUBTRACT)
    # profile 3 of 4: a face of its own
    with BuildSketch(Plane(origin=(-38.54293994, 0, -22.25277675), x_dir=(-0.4999999999999996, 0, 0.8660254037844389), z_dir=(-0.8660254037844389, 0, -0.4999999999999996)).offset(CUT_EXTRUDE14_START)):
        with Locations((10.132050808, 7)):
            Circle(SKETCH5_3_R)
        with Locations((10.132050808, 7)):
            Circle(SKETCH5_3_R_2, mode=Mode.SUBTRACT)
    # profile 4 of 4: a face of its own
    with BuildSketch(Plane(origin=(-38.54293994, 0, -22.25277675), x_dir=(-0.4999999999999996, 0, 0.8660254037844389), z_dir=(-0.8660254037844389, 0, -0.4999999999999996)).offset(CUT_EXTRUDE14_START)):
        with Locations((10.132050808, 7)):
            Circle(SKETCH5_3_R_2)
    extrude(amount=-CUT_EXTRUDE14_DEPTH, mode=Mode.SUBTRACT)

    # Sketch5<4> → Cut-Extrude15 (cut)
    # profile 1 of 2: a face of its own
    with BuildSketch(Plane(origin=(-38.54293994, 0, -22.25277675), x_dir=(-0.4999999999999996, 0, 0.8660254037844389), z_dir=(-0.8660254037844389, 0, -0.4999999999999996)).offset(CUT_EXTRUDE15_START)):
        with Locations((10.132050808, 7)):
            Circle(SKETCH5_4_R)
        with Locations((10.132050808, 7)):
            Circle(SKETCH5_4_R_2, mode=Mode.SUBTRACT)
    # profile 2 of 2: a face of its own
    with BuildSketch(Plane(origin=(-38.54293994, 0, -22.25277675), x_dir=(-0.4999999999999996, 0, 0.8660254037844389), z_dir=(-0.8660254037844389, 0, -0.4999999999999996)).offset(CUT_EXTRUDE15_START)):
        with Locations((10.132050808, 7)):
            Circle(SKETCH5_4_R_2)
    extrude(amount=-CUT_EXTRUDE15_DEPTH, mode=Mode.SUBTRACT)


solid = part.part
